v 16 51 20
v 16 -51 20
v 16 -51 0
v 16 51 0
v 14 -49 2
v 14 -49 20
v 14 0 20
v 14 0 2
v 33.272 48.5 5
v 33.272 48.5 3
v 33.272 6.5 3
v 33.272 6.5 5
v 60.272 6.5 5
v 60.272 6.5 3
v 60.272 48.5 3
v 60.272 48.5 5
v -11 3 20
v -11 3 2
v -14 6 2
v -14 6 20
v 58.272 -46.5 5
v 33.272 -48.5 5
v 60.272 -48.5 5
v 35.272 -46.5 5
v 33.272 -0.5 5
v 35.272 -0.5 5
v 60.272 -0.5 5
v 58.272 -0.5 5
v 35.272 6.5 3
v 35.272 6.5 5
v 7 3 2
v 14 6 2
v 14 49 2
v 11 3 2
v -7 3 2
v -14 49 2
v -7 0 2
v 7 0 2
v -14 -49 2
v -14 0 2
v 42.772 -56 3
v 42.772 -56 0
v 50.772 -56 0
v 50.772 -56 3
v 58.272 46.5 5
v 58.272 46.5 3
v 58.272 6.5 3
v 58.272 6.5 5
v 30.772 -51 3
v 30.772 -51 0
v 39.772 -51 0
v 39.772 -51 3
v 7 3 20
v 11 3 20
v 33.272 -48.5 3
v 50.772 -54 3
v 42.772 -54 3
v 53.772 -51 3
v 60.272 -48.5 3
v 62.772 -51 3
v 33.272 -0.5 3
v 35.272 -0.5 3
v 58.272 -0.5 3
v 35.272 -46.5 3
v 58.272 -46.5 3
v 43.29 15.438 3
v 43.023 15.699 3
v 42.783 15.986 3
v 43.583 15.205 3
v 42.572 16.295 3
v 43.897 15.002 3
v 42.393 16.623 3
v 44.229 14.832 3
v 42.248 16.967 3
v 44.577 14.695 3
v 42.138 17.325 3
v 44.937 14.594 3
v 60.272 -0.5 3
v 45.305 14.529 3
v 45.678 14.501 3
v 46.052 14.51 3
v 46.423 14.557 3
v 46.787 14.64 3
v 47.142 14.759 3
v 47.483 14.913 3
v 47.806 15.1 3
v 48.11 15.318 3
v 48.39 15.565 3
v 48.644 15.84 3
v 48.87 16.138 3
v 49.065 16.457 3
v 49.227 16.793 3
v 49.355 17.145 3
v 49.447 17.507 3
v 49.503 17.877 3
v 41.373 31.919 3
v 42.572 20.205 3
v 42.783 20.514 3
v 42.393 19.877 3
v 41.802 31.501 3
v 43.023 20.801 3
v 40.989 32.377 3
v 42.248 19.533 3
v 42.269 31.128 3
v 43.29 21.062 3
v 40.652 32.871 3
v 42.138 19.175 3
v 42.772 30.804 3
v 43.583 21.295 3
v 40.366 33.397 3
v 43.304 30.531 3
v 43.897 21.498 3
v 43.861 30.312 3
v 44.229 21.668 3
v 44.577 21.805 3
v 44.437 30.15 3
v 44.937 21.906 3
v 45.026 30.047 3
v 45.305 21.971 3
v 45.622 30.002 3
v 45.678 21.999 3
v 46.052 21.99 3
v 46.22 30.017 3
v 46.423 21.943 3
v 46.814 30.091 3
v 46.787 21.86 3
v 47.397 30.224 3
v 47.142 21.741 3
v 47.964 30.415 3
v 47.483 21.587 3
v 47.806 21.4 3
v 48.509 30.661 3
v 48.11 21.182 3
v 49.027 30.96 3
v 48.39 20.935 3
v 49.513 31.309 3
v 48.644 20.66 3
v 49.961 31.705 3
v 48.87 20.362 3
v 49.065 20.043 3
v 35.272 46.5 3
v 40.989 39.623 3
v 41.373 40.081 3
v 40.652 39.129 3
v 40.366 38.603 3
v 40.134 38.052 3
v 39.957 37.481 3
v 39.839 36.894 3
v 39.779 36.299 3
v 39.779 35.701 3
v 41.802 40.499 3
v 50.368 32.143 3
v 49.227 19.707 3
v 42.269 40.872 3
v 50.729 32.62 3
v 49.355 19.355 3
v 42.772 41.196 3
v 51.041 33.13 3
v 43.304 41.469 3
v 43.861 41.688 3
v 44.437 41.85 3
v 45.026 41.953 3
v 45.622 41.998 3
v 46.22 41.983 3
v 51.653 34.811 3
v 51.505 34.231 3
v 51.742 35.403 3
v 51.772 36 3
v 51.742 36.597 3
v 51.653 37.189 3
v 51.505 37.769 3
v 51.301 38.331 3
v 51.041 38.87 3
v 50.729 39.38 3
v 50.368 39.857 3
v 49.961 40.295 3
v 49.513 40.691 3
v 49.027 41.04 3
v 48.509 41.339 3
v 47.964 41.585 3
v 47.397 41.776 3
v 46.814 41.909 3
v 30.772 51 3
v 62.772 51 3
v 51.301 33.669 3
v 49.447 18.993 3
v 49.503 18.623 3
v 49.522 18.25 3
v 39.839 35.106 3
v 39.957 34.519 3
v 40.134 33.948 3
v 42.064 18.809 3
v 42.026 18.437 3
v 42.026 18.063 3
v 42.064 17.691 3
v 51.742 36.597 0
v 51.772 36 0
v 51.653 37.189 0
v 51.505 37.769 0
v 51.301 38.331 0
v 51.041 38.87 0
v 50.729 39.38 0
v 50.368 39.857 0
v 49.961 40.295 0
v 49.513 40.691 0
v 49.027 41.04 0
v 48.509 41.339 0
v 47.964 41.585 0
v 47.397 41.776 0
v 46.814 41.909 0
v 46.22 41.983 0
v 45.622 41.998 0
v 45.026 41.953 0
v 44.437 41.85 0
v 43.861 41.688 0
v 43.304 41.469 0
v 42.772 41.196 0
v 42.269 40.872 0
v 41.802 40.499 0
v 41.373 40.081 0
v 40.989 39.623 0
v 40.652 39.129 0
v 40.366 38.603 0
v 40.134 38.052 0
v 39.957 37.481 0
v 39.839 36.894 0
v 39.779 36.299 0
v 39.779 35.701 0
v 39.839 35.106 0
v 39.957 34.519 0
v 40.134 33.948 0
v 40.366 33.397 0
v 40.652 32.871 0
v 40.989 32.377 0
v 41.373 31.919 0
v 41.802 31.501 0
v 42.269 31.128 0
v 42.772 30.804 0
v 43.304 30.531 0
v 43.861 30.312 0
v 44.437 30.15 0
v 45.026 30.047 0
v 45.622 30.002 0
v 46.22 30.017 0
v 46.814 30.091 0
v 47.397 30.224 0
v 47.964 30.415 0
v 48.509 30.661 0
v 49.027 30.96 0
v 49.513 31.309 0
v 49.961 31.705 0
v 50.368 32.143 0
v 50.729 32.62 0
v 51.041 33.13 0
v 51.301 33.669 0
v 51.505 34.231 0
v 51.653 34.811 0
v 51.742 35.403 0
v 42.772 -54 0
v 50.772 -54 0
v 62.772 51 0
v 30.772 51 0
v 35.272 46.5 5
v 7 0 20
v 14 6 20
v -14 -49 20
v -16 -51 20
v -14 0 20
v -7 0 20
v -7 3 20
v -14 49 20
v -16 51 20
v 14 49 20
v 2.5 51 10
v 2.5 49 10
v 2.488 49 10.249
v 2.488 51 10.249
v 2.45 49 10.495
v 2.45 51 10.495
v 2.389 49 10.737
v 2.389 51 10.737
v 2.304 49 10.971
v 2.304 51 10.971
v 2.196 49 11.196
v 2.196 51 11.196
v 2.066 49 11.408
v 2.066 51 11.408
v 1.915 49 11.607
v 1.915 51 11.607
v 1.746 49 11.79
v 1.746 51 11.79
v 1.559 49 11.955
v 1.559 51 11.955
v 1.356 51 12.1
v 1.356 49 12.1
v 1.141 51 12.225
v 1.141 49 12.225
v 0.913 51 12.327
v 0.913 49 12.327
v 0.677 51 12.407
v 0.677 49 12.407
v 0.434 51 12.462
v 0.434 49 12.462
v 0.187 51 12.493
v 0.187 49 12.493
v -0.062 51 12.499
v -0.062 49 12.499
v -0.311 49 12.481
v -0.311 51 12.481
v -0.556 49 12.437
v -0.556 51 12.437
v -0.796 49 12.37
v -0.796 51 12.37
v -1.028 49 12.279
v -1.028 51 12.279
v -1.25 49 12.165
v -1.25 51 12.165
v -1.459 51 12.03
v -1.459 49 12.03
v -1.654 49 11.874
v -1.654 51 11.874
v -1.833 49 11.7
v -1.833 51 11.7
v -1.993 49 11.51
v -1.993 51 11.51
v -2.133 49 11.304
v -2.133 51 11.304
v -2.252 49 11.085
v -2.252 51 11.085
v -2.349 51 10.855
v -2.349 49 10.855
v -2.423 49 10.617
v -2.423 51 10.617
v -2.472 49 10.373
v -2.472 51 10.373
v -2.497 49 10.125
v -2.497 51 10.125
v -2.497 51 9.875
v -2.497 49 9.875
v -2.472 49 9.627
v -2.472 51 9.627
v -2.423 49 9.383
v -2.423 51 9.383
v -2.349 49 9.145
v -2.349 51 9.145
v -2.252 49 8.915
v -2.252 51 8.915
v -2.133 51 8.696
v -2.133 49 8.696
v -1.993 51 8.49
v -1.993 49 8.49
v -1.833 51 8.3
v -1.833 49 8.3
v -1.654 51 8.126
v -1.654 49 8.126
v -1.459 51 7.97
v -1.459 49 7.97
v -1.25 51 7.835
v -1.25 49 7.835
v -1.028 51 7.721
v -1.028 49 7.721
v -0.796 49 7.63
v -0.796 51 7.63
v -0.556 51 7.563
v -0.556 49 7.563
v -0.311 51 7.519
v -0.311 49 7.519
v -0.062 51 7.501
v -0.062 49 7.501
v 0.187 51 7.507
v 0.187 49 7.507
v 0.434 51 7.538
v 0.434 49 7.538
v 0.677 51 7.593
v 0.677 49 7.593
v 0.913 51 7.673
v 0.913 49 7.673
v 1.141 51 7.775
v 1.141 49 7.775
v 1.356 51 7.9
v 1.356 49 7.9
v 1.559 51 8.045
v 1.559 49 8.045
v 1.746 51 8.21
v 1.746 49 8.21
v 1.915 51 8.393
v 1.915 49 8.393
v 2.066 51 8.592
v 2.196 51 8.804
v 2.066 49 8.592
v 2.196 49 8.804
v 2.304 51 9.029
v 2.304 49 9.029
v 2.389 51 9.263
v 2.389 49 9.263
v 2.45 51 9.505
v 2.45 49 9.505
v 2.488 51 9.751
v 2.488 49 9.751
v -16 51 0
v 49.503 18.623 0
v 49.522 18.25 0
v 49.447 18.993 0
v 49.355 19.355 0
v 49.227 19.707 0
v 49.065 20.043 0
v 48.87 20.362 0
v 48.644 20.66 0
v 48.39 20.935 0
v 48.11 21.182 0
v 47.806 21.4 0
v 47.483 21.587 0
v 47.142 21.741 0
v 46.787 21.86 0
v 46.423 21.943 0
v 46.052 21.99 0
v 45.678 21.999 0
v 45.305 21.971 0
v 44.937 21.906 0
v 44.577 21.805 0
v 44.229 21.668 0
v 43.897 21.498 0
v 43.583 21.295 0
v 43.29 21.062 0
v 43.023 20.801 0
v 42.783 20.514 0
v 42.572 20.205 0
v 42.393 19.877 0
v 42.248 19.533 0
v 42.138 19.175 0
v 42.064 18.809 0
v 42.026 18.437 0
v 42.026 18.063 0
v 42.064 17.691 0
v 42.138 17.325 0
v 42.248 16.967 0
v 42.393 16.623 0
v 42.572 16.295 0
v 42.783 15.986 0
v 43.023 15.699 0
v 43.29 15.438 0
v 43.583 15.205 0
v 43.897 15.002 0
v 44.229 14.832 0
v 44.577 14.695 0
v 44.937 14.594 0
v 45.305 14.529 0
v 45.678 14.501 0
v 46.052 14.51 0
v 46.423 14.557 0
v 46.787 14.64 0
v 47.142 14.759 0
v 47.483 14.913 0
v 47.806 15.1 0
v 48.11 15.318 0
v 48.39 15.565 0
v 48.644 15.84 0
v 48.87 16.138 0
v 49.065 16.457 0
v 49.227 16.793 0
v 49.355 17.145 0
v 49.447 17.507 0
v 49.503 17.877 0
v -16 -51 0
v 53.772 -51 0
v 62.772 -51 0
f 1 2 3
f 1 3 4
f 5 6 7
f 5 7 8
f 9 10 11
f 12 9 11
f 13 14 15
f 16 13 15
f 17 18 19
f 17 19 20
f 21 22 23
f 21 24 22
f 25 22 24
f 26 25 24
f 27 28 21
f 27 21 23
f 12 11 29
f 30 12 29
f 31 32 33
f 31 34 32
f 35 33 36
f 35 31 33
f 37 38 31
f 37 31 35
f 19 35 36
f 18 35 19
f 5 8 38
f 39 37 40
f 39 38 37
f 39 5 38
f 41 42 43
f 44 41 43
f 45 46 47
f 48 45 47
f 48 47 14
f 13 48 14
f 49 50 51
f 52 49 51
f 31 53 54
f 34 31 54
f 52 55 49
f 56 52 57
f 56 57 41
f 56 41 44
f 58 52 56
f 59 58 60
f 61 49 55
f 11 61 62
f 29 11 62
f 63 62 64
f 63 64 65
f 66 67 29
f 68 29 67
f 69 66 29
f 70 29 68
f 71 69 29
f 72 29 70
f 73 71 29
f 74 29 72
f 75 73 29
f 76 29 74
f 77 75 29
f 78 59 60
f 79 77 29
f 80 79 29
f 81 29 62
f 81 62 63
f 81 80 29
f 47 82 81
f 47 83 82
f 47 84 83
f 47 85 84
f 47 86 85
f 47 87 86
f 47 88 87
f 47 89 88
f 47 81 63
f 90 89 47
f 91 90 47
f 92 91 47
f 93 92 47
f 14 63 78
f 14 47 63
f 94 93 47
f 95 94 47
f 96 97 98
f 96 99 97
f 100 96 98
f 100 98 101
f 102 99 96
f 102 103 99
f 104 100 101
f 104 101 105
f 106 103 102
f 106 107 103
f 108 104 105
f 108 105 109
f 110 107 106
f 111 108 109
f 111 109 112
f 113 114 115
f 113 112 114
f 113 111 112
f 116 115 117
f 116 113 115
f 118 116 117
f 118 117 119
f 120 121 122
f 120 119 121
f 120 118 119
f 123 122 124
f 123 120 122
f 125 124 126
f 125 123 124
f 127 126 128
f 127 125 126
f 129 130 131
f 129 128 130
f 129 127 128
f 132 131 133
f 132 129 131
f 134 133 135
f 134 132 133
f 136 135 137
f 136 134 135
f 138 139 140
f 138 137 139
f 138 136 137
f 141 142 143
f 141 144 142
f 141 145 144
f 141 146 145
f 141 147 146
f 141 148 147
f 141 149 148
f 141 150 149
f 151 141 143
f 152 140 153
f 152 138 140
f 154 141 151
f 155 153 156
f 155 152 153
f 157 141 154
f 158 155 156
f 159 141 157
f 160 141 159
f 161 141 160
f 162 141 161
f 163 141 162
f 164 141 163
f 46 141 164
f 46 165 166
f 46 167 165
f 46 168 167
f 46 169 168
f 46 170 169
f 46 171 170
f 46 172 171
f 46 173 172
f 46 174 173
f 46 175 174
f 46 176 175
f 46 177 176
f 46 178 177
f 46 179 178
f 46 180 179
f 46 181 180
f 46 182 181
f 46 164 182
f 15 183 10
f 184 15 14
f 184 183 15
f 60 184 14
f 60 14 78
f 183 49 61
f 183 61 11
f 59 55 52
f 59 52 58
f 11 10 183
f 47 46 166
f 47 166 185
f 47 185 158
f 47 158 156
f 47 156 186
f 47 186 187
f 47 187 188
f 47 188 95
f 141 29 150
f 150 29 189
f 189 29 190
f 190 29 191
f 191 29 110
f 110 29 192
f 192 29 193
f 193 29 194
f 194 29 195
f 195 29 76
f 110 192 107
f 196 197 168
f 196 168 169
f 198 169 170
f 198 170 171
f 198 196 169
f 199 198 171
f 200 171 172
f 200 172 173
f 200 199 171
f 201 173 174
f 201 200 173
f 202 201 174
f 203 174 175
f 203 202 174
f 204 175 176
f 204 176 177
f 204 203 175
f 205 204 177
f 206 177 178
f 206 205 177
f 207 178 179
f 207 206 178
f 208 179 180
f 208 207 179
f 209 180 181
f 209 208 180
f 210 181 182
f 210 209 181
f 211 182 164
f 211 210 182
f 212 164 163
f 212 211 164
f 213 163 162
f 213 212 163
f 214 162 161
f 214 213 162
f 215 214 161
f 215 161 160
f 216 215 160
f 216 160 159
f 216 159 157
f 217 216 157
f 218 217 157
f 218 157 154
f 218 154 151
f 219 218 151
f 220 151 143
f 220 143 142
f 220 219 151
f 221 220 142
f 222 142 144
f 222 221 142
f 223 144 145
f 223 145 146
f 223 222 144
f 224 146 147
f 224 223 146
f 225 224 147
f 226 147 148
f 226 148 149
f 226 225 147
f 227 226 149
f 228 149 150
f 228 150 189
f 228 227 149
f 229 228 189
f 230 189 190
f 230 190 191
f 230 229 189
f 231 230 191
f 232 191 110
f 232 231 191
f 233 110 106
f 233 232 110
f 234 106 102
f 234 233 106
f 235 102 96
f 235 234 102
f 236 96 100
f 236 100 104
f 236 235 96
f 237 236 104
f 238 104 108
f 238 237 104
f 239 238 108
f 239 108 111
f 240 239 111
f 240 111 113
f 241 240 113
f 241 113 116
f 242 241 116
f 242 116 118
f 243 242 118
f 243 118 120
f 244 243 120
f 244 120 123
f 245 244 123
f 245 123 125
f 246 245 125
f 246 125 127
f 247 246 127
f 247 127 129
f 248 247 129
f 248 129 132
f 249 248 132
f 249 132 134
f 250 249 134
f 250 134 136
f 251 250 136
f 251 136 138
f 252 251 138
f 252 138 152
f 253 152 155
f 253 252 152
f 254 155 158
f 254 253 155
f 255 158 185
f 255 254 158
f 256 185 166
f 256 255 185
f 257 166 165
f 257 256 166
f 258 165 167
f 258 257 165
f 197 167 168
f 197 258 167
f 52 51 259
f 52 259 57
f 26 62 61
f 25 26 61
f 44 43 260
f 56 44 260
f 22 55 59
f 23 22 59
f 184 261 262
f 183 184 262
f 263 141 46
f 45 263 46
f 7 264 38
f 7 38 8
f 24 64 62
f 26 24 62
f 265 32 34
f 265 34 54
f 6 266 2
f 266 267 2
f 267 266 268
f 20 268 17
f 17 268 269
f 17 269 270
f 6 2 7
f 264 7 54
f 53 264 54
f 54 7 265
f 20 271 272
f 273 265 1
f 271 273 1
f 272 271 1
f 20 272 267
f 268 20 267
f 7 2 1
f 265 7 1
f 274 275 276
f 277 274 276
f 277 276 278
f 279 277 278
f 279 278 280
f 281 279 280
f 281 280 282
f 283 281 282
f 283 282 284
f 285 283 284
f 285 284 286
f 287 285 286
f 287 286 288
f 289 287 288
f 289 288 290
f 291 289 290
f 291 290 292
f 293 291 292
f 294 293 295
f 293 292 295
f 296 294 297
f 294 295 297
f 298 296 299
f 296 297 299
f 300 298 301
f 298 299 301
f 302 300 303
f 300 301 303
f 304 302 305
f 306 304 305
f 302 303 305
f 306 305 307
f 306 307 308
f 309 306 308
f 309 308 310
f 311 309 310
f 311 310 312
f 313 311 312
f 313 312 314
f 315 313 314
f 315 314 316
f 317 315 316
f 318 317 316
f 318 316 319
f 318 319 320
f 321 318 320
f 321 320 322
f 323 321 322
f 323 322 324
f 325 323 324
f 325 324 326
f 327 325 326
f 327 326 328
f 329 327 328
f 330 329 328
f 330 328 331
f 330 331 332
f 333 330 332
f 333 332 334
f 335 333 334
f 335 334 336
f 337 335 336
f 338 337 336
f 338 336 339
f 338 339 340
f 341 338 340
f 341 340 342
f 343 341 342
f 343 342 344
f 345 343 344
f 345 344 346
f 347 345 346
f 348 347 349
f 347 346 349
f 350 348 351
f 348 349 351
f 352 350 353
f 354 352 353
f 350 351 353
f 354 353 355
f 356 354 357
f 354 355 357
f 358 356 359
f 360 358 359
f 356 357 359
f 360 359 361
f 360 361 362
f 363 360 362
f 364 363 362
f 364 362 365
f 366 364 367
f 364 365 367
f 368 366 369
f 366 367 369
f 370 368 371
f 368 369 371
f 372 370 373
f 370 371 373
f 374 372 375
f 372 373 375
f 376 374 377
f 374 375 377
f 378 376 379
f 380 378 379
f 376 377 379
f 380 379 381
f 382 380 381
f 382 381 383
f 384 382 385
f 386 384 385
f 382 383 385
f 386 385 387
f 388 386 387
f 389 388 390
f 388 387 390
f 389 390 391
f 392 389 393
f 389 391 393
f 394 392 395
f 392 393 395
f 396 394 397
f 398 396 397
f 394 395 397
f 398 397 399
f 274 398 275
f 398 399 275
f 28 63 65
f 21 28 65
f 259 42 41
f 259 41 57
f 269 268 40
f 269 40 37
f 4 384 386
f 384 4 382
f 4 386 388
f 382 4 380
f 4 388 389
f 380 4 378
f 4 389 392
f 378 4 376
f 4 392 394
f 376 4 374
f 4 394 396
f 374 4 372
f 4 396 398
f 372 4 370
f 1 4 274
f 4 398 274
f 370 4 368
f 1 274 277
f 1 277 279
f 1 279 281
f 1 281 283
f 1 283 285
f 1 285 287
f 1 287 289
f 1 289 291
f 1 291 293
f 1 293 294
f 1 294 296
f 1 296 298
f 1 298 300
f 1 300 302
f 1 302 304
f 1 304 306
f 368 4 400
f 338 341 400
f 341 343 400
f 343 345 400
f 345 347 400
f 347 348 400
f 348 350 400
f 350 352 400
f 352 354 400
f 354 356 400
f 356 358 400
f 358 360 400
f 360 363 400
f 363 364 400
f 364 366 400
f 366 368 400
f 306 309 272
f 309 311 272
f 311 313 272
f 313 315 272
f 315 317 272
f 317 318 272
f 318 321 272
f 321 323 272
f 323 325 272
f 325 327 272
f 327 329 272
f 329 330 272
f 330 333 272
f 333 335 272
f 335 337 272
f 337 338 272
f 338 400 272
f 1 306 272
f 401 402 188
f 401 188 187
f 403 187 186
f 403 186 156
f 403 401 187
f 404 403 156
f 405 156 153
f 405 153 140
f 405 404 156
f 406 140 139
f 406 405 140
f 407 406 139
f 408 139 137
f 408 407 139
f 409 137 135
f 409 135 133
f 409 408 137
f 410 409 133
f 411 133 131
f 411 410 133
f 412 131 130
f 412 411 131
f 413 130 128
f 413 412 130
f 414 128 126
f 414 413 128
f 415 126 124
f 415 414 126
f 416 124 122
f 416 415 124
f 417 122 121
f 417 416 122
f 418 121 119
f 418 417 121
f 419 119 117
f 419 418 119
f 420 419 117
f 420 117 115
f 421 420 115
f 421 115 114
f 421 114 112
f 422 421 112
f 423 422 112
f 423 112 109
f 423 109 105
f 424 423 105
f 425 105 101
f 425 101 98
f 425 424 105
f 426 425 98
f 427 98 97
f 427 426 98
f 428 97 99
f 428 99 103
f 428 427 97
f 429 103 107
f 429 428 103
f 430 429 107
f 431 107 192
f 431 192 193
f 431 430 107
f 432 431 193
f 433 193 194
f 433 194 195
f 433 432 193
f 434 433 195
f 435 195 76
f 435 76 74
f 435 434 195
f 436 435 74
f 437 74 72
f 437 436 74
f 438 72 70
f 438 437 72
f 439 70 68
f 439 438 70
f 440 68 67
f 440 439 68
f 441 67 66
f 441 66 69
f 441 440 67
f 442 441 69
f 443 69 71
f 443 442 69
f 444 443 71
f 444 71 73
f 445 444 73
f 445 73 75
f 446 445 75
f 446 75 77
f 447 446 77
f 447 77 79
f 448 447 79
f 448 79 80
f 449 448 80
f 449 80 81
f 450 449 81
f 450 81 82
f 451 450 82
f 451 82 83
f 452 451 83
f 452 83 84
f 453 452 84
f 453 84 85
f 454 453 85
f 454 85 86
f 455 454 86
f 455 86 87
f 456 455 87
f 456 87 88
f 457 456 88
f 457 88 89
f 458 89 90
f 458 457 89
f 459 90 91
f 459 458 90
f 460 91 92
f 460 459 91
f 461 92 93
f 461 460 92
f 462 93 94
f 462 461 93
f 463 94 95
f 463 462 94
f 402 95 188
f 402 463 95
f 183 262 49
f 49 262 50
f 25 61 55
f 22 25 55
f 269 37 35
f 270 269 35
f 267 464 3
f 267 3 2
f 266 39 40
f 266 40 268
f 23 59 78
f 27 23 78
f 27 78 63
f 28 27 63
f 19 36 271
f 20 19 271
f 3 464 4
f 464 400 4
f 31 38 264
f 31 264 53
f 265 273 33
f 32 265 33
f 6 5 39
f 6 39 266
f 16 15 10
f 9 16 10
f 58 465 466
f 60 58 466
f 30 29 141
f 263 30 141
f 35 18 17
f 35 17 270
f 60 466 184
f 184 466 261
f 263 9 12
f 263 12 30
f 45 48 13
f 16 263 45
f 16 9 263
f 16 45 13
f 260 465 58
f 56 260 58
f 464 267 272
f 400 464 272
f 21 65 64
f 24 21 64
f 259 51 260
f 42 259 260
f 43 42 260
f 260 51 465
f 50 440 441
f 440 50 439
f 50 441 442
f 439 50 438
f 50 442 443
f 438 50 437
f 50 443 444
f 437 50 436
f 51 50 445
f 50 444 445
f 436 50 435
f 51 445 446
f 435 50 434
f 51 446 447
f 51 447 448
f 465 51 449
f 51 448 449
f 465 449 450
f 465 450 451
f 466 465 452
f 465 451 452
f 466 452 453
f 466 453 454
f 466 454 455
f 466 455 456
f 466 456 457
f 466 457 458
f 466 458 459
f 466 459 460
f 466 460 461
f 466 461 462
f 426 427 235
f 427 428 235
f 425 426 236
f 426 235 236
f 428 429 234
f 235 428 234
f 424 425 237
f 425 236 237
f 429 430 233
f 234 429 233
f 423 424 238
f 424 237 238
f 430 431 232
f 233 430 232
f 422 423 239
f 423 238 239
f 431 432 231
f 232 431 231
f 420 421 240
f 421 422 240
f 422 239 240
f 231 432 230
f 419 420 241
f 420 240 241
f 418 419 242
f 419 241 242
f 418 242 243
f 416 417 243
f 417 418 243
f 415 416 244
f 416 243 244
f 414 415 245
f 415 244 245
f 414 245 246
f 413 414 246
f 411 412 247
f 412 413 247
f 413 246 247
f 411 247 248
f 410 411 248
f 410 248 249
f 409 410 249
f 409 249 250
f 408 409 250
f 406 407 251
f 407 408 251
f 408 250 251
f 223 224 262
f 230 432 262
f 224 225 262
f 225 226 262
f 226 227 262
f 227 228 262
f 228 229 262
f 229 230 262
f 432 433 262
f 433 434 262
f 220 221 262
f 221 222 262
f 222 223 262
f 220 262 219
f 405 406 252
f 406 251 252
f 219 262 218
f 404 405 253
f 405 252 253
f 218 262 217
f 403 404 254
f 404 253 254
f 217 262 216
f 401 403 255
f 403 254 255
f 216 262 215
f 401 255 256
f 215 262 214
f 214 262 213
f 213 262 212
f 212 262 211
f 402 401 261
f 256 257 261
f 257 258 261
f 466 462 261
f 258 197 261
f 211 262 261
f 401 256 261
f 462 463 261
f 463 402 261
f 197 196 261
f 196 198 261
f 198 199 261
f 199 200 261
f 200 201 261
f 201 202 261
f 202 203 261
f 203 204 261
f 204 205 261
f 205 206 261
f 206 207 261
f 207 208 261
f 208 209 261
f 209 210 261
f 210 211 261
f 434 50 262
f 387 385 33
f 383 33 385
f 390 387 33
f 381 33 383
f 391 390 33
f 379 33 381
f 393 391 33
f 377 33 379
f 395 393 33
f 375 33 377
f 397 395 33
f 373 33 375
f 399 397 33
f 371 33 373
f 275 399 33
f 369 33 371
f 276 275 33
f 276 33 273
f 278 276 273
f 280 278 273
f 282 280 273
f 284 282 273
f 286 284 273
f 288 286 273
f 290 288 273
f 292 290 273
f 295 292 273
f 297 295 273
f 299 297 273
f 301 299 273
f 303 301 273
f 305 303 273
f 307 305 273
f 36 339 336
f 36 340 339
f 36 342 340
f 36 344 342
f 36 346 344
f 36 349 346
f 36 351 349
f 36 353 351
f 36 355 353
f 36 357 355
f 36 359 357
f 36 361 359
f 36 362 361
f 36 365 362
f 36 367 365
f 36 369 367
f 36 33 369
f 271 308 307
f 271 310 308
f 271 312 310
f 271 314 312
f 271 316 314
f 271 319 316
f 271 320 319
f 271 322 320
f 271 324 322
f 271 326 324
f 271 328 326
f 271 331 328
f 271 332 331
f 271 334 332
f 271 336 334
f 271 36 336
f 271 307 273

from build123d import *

# Parameters (mm, degrees)
F1_DEPTH      = 49
F1_DEPTH_BACK = 49
F2_W          = 2
F2_H          = 20
F3_DEPTH      = 16
F3_DEPTH_BACK = 16
F4_W          = 7
F4_H          = 3
F5_DEPTH      = 20
F6_R          = 2.5
F7_DEPTH      = 51.001
F8_R          = 3.75
F8_R_2        = 6
F8_W          = 8
F8_H          = 5
F9_DEPTH      = 3
F10_DEPTH     = 5
F11_SIZE      = 3
F11_2_SIZE    = 3


with BuildPart() as f1:
    # F0 (on Front) → F1 (new body, two sides)
    with BuildSketch(Plane.XZ) as f1_sk:
        Polygon((-14, 20), (-16, 20), (-16, 0), (16, 0), (16, 20), (14, 20), (14, 2), (-14, 2), align=None)
    extrude(amount=F1_DEPTH)
    extrude(f1_sk.sketch, amount=-F1_DEPTH_BACK)

    # F2 (on Right) → F3 (join, two sides)
    with BuildSketch(Plane.YZ) as f3_sk:
        with Locations((-50, 10)):
            Rectangle(F2_W, F2_H)
        with Locations((50, 10)):
            Rectangle(F2_W, F2_H)
    extrude(amount=F3_DEPTH)
    extrude(f3_sk.sketch, amount=-F3_DEPTH_BACK)

    # F4 (on Top) → F5 (join)
    with BuildSketch(Plane.XY):
        with Locations((-10.5, 1.5)):
            Rectangle(F4_W, F4_H)
        with Locations((10.5, 1.5)):
            Rectangle(F4_W, F4_H)
    extrude(amount=F5_DEPTH)

    # F6 (on Front) → F7 (cut, through all)
    with BuildSketch(Plane.XZ):
        with Locations((0, 10)):
            Circle(F6_R)
    extrude(amount=-F7_DEPTH, mode=Mode.SUBTRACT)

    # F11
    f11_edges = [f1.edges().sort_by_distance(p)[0] for p in [
        (-14, 3, 11),
        (14, 3, 11),
    ]]
    chamfer(f11_edges, length=F11_SIZE)


with BuildPart() as f9:
    # F8 (on Top) → F9 (new body)
    with BuildSketch(Plane.XY):
        Polygon((62.771771, 51), (30.771771, 51), (30.771771, -51), (42.771771, -51), (50.771771, -51), (62.771771, -51), align=None)
        Polygon((60.271771, -48.5), (33.271771, -48.5), (33.271771, -0.5), (35.271771, -0.5), (35.271771, -46.5), (58.271771, -46.5), (58.271771, -0.5), (60.271771, -0.5), align=None, mode=Mode.SUBTRACT)
        with Locations((45.771771, 18.25)):
            Circle(F8_R, mode=Mode.SUBTRACT)
        Polygon((33.271771, 6.5), (33.271771, 48.5), (60.271771, 48.5), (60.271771, 6.5), (58.271771, 6.5), (58.271771, 46.5), (35.271771, 46.5), (35.271771, 6.5), align=None, mode=Mode.SUBTRACT)
        with Locations((45.771771, 36)):
            Circle(F8_R_2, mode=Mode.SUBTRACT)
        with Locations((46.771771, -53.5)):
            Rectangle(F8_W, F8_H)
    extrude(amount=F9_DEPTH)

    # F8 (on Top) → F10 (join)
    with BuildSketch(Plane.XY):
        Polygon((60.271771, 48.5), (33.271771, 48.5), (33.271771, 6.5), (35.271771, 6.5), (35.271771, 46.5), (58.271771, 46.5), (58.271771, 6.5), (60.271771, 6.5), align=None)
        Polygon((33.271771, -0.5), (33.271771, -48.5), (60.271771, -48.5), (60.271771, -0.5), (58.271771, -0.5), (58.271771, -46.5), (35.271771, -46.5), (35.271771, -0.5), align=None)
    extrude(amount=F10_DEPTH)

    # F11#2
    f11_2_edges = [f9.edges().sort_by_distance(p)[0] for p in [
        (50.771771, -51, 1.5),
        (42.771771, -51, 1.5),
    ]]
    chamfer(f11_2_edges, length=F11_2_SIZE)


solid = Compound([f1.part, f9.part])
